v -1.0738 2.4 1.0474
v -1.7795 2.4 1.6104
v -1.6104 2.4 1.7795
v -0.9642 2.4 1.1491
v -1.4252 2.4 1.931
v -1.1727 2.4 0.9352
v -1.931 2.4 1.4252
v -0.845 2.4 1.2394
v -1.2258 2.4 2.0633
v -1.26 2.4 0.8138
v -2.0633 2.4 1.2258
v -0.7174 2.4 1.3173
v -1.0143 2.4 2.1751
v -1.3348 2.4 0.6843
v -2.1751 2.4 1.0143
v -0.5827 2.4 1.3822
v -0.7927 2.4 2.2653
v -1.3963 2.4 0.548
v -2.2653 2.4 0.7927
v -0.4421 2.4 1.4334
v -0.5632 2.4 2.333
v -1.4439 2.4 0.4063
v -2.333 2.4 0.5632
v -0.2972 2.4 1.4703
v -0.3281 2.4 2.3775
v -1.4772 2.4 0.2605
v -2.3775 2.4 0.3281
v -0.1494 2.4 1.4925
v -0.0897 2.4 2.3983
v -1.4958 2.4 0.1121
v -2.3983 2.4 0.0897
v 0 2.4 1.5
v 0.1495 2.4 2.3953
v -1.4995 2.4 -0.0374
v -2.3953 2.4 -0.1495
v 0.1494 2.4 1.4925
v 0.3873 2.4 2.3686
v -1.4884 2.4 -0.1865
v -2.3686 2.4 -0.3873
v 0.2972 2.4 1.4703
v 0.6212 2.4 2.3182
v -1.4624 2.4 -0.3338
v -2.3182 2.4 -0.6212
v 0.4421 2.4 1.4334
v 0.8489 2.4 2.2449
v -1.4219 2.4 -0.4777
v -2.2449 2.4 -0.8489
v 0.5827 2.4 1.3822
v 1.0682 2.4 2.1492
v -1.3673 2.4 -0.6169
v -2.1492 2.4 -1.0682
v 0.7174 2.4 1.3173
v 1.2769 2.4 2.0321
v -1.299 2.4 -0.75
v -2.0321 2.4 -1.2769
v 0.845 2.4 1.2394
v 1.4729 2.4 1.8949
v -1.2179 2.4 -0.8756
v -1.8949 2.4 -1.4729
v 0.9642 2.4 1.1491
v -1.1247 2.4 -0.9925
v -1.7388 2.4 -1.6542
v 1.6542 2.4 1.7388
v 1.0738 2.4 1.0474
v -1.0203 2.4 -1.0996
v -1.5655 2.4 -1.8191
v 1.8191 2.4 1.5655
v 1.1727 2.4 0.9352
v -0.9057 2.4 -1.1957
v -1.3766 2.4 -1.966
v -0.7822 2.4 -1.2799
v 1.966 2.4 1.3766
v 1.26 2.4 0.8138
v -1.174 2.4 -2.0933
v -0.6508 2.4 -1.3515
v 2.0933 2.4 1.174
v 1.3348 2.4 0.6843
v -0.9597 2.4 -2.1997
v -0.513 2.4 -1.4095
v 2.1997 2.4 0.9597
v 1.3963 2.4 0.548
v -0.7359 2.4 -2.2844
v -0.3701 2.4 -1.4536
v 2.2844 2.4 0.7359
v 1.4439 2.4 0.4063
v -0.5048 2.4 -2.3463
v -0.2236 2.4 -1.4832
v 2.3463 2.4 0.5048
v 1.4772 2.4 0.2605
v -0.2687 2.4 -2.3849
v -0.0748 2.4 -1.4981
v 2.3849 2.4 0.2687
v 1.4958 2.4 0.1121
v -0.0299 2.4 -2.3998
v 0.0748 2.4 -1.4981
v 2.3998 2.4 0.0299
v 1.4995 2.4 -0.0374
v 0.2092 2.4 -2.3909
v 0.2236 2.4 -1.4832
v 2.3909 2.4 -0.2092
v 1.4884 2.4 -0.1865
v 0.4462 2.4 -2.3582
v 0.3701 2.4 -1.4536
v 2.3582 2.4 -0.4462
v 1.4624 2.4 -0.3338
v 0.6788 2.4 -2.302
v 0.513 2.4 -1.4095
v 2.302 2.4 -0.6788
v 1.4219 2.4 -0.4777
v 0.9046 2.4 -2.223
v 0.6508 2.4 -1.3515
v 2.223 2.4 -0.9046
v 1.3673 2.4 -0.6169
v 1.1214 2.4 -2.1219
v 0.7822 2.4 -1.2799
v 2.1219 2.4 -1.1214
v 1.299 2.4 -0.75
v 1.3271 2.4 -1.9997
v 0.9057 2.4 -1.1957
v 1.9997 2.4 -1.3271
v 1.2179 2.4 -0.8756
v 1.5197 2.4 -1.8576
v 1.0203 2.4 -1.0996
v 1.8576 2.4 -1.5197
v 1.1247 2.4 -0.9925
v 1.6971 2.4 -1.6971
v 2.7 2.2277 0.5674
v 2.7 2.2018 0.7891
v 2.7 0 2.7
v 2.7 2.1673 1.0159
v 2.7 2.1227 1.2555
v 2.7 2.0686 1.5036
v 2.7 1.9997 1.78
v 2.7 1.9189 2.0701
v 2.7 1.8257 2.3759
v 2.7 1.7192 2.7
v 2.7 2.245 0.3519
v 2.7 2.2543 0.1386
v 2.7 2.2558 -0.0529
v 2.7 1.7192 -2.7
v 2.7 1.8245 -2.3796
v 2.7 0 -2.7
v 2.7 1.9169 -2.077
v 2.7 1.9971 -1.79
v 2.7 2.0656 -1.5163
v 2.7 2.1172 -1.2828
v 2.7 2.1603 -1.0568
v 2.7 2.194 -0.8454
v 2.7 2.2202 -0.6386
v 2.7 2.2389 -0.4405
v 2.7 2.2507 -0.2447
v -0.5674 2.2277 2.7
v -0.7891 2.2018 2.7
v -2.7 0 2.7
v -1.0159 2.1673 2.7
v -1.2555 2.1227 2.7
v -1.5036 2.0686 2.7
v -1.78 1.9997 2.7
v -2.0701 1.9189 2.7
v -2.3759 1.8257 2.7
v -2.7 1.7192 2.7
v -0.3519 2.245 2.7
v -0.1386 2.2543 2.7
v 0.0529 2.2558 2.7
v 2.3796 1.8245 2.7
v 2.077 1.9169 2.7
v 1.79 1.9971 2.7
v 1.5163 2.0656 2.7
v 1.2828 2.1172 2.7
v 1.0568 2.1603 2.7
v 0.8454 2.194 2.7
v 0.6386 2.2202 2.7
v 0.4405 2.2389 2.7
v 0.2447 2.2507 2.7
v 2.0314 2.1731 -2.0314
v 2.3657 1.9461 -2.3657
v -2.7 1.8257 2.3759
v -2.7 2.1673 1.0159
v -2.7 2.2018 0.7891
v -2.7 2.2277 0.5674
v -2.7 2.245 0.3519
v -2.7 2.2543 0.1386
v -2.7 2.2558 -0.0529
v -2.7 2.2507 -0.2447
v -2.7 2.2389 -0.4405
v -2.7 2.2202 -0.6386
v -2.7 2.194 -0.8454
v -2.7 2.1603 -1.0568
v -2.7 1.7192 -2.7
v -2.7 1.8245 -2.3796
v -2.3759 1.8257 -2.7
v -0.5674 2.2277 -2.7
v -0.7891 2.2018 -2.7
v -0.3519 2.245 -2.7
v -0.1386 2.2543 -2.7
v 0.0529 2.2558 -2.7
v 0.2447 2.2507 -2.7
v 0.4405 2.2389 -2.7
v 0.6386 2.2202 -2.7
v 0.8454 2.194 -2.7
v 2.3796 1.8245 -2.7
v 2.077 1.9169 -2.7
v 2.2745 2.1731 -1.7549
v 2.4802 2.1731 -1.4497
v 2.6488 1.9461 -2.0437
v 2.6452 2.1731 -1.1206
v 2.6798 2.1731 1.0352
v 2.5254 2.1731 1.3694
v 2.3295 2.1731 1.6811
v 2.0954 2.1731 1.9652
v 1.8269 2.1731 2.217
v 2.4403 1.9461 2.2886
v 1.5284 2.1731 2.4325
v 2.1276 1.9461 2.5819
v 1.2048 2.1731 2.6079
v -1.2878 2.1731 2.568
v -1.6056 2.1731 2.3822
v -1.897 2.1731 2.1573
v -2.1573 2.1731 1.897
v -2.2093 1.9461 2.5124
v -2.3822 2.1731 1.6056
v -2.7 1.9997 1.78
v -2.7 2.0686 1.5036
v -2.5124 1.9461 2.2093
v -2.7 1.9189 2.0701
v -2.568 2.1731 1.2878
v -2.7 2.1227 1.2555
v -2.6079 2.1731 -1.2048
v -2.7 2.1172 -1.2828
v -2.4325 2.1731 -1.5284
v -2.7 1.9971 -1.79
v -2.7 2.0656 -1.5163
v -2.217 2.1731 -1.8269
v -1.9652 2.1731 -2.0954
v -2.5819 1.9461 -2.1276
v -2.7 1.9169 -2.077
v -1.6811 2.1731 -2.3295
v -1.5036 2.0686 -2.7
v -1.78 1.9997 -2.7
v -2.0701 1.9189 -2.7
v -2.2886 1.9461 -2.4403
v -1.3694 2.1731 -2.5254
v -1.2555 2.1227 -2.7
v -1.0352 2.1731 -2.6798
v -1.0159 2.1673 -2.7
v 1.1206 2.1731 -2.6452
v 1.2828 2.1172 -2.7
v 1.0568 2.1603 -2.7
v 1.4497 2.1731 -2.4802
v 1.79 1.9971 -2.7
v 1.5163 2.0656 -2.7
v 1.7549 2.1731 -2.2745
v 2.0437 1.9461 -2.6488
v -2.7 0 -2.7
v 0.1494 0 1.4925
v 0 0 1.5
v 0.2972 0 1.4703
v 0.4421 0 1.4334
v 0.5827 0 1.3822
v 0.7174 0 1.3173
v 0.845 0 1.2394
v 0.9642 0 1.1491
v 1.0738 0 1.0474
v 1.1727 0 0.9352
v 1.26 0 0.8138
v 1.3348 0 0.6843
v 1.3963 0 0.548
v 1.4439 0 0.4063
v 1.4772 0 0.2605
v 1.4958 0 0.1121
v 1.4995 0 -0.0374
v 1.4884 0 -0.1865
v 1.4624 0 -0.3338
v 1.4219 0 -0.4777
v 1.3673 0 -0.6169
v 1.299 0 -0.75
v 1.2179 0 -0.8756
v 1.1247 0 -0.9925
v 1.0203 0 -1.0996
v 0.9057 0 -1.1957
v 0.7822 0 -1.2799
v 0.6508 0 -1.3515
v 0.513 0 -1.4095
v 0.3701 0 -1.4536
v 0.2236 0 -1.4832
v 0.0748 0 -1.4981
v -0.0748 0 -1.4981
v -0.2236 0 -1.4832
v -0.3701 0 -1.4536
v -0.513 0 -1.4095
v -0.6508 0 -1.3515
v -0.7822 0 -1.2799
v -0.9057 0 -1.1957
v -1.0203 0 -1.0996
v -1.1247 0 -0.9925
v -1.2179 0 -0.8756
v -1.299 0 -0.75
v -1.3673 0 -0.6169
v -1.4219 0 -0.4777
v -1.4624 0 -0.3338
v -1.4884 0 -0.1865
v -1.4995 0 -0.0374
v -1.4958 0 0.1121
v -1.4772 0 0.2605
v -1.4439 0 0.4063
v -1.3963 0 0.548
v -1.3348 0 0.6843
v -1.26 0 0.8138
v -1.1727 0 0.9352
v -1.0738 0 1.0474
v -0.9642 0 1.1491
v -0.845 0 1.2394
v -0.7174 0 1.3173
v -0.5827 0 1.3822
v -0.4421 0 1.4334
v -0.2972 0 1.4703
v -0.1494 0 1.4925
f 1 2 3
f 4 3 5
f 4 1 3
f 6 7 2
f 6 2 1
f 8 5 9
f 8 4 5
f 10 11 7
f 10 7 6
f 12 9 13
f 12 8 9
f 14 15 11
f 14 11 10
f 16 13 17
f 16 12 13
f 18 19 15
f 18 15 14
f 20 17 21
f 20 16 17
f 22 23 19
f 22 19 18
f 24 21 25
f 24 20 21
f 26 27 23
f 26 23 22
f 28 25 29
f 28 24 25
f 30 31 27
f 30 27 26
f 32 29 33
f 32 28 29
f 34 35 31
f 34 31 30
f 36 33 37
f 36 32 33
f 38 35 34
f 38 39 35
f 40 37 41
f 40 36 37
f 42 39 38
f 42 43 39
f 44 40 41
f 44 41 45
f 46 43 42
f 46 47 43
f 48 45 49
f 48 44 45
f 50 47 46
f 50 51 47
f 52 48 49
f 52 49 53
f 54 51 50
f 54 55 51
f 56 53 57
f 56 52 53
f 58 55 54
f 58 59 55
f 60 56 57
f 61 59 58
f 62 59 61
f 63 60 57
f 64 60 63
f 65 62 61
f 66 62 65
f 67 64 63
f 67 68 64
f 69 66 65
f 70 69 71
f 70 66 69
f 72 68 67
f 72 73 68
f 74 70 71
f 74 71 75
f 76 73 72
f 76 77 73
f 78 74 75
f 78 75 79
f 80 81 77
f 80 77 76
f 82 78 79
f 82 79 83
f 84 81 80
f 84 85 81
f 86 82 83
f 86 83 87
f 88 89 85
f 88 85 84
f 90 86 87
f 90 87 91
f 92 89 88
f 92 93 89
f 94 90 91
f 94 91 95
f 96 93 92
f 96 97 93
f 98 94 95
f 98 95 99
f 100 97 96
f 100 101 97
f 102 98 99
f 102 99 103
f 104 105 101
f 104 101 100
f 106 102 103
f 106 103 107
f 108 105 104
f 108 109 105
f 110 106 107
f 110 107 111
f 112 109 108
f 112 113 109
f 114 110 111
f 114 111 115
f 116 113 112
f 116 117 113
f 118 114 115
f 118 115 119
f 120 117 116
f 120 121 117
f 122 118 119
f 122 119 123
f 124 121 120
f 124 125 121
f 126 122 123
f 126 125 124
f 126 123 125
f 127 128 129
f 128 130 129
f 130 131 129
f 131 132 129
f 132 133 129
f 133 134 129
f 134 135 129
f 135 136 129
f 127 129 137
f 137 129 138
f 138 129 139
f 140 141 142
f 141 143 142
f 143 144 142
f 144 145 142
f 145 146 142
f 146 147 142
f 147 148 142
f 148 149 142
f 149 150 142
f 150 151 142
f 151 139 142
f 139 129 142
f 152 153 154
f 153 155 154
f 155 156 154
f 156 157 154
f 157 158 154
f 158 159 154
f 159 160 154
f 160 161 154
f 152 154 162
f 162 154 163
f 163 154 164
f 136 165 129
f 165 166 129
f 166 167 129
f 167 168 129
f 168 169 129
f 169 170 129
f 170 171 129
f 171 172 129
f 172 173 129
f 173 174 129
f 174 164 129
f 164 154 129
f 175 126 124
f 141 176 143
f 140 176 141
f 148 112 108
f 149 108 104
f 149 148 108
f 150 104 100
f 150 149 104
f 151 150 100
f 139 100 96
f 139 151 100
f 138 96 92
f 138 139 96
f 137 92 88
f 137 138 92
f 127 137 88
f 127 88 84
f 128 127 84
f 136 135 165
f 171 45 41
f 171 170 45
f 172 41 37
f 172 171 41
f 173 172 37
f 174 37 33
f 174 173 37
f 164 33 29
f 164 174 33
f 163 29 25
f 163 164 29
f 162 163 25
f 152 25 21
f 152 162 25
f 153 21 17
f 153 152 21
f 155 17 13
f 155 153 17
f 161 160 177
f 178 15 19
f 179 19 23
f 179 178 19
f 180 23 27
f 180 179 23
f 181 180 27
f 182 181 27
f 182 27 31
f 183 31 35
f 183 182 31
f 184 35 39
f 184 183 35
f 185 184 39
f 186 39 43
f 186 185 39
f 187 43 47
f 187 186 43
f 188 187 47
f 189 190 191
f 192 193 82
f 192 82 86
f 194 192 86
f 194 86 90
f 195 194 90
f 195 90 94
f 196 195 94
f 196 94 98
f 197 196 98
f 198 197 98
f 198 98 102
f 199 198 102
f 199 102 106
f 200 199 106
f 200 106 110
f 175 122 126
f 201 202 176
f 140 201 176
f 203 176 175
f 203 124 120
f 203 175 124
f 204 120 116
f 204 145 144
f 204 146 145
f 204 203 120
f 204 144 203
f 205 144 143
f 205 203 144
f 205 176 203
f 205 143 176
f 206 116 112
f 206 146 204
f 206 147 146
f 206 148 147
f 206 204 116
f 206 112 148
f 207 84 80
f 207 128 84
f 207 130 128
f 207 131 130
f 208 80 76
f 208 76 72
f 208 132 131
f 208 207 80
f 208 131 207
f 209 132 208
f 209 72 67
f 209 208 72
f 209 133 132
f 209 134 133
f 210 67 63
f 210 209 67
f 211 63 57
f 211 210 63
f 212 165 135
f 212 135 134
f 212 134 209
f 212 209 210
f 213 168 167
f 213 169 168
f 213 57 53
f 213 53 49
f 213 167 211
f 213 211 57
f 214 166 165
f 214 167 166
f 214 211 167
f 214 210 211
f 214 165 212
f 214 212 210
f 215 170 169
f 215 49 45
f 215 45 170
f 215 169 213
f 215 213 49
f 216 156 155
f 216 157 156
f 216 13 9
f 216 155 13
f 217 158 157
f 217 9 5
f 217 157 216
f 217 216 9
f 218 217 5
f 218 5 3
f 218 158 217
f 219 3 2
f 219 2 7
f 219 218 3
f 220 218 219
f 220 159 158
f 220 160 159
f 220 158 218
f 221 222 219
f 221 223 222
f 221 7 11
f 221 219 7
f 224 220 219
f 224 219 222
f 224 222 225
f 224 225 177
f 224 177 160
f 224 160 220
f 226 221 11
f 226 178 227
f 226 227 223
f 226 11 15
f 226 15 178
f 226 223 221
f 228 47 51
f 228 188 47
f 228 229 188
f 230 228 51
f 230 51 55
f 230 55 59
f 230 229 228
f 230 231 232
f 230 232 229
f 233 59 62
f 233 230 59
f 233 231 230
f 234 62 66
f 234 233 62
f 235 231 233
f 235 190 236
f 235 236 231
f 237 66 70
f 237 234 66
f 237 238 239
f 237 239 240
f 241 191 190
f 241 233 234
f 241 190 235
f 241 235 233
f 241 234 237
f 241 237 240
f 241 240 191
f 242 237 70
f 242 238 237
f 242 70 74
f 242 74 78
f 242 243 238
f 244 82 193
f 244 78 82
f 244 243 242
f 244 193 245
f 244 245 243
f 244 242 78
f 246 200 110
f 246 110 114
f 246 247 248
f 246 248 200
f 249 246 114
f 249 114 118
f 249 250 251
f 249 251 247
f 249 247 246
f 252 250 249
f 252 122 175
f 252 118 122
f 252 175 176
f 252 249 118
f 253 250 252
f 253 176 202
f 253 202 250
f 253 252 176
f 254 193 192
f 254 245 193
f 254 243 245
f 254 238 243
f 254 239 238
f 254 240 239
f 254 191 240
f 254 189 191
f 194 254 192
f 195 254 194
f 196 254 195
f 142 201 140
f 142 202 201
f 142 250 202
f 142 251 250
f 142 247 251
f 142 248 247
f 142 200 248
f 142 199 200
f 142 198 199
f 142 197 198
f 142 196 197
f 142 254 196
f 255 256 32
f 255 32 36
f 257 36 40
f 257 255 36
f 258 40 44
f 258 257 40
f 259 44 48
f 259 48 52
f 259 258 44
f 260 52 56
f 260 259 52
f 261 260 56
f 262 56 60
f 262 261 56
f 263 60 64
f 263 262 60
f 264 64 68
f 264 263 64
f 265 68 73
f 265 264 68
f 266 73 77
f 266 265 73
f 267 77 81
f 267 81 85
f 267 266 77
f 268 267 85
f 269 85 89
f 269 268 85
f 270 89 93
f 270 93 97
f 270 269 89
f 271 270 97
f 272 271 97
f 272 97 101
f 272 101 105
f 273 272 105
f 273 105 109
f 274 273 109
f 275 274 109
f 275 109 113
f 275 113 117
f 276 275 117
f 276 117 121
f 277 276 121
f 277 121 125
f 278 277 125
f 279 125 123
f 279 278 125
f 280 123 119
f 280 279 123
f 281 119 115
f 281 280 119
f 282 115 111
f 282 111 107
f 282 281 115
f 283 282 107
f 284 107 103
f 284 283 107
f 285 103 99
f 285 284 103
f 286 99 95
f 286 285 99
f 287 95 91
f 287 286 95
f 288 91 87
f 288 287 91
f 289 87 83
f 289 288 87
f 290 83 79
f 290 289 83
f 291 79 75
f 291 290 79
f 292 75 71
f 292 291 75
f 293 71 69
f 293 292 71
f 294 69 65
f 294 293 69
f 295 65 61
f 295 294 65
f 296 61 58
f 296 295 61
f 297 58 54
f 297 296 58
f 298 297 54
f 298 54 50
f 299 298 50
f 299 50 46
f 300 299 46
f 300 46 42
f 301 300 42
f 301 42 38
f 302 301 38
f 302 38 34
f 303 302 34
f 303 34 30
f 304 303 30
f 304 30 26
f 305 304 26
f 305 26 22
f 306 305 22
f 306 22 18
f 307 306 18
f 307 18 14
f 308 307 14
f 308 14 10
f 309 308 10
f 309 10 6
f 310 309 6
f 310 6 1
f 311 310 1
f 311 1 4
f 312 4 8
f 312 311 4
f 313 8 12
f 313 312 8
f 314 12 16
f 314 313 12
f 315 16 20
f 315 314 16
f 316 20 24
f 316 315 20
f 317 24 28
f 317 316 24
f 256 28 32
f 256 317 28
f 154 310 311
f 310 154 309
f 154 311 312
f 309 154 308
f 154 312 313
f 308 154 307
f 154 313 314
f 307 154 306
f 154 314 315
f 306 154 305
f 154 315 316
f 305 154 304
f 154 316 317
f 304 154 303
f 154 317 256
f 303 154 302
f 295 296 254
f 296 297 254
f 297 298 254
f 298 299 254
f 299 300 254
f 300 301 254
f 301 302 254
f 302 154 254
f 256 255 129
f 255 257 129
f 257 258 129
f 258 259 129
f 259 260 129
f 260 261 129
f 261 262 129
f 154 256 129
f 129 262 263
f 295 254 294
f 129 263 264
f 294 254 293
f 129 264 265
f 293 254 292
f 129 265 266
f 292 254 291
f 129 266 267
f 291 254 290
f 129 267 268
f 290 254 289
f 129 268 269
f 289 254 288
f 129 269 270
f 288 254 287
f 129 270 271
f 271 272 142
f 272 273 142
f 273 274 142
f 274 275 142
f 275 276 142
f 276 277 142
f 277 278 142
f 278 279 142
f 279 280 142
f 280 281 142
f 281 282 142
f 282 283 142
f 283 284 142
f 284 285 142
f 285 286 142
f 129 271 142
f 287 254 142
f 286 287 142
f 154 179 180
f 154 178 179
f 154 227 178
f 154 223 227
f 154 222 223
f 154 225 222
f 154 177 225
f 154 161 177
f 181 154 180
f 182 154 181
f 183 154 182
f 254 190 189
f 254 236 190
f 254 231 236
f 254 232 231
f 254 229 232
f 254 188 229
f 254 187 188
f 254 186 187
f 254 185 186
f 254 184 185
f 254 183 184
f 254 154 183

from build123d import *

# Parameters (mm, degrees)
SKETCH1_W           = 5.4
SKETCH1_H           = 5.4
SKETCH1_R           = 1.5
BOSS_EXTRUDE1_DEPTH = 2.4


with BuildPart() as part:
    # Sketch1 → Boss-Extrude1 (new body)
    with BuildSketch(Plane(origin=(0, 0, 0), x_dir=(1, 0, 0), z_dir=(0, 1, 0))):
        Rectangle(SKETCH1_W, SKETCH1_H)
        with Locations(Location((0, 0, 0), (0, 0, 270))):
            Circle(SKETCH1_R, mode=Mode.SUBTRACT)
    extrude(amount=BOSS_EXTRUDE1_DEPTH)

    # Sketch2 → Cut-Revolve1 (revolve, cut)
    with BuildSketch(Plane.XY, mode=Mode.PRIVATE) as cut_revolve1_sk:
        Polygon((-2.4, 2.4), (-4.9, 1.2), (-4.9, 2.4), align=None)
    revolve(cut_revolve1_sk.sketch.rotate(Axis((0, 2.4, 0), (0, -1, 0)), 134.999999961), axis=Axis((0, 2.4, 0), (0, -1, 0)), mode=Mode.SUBTRACT)


solid = part.part
